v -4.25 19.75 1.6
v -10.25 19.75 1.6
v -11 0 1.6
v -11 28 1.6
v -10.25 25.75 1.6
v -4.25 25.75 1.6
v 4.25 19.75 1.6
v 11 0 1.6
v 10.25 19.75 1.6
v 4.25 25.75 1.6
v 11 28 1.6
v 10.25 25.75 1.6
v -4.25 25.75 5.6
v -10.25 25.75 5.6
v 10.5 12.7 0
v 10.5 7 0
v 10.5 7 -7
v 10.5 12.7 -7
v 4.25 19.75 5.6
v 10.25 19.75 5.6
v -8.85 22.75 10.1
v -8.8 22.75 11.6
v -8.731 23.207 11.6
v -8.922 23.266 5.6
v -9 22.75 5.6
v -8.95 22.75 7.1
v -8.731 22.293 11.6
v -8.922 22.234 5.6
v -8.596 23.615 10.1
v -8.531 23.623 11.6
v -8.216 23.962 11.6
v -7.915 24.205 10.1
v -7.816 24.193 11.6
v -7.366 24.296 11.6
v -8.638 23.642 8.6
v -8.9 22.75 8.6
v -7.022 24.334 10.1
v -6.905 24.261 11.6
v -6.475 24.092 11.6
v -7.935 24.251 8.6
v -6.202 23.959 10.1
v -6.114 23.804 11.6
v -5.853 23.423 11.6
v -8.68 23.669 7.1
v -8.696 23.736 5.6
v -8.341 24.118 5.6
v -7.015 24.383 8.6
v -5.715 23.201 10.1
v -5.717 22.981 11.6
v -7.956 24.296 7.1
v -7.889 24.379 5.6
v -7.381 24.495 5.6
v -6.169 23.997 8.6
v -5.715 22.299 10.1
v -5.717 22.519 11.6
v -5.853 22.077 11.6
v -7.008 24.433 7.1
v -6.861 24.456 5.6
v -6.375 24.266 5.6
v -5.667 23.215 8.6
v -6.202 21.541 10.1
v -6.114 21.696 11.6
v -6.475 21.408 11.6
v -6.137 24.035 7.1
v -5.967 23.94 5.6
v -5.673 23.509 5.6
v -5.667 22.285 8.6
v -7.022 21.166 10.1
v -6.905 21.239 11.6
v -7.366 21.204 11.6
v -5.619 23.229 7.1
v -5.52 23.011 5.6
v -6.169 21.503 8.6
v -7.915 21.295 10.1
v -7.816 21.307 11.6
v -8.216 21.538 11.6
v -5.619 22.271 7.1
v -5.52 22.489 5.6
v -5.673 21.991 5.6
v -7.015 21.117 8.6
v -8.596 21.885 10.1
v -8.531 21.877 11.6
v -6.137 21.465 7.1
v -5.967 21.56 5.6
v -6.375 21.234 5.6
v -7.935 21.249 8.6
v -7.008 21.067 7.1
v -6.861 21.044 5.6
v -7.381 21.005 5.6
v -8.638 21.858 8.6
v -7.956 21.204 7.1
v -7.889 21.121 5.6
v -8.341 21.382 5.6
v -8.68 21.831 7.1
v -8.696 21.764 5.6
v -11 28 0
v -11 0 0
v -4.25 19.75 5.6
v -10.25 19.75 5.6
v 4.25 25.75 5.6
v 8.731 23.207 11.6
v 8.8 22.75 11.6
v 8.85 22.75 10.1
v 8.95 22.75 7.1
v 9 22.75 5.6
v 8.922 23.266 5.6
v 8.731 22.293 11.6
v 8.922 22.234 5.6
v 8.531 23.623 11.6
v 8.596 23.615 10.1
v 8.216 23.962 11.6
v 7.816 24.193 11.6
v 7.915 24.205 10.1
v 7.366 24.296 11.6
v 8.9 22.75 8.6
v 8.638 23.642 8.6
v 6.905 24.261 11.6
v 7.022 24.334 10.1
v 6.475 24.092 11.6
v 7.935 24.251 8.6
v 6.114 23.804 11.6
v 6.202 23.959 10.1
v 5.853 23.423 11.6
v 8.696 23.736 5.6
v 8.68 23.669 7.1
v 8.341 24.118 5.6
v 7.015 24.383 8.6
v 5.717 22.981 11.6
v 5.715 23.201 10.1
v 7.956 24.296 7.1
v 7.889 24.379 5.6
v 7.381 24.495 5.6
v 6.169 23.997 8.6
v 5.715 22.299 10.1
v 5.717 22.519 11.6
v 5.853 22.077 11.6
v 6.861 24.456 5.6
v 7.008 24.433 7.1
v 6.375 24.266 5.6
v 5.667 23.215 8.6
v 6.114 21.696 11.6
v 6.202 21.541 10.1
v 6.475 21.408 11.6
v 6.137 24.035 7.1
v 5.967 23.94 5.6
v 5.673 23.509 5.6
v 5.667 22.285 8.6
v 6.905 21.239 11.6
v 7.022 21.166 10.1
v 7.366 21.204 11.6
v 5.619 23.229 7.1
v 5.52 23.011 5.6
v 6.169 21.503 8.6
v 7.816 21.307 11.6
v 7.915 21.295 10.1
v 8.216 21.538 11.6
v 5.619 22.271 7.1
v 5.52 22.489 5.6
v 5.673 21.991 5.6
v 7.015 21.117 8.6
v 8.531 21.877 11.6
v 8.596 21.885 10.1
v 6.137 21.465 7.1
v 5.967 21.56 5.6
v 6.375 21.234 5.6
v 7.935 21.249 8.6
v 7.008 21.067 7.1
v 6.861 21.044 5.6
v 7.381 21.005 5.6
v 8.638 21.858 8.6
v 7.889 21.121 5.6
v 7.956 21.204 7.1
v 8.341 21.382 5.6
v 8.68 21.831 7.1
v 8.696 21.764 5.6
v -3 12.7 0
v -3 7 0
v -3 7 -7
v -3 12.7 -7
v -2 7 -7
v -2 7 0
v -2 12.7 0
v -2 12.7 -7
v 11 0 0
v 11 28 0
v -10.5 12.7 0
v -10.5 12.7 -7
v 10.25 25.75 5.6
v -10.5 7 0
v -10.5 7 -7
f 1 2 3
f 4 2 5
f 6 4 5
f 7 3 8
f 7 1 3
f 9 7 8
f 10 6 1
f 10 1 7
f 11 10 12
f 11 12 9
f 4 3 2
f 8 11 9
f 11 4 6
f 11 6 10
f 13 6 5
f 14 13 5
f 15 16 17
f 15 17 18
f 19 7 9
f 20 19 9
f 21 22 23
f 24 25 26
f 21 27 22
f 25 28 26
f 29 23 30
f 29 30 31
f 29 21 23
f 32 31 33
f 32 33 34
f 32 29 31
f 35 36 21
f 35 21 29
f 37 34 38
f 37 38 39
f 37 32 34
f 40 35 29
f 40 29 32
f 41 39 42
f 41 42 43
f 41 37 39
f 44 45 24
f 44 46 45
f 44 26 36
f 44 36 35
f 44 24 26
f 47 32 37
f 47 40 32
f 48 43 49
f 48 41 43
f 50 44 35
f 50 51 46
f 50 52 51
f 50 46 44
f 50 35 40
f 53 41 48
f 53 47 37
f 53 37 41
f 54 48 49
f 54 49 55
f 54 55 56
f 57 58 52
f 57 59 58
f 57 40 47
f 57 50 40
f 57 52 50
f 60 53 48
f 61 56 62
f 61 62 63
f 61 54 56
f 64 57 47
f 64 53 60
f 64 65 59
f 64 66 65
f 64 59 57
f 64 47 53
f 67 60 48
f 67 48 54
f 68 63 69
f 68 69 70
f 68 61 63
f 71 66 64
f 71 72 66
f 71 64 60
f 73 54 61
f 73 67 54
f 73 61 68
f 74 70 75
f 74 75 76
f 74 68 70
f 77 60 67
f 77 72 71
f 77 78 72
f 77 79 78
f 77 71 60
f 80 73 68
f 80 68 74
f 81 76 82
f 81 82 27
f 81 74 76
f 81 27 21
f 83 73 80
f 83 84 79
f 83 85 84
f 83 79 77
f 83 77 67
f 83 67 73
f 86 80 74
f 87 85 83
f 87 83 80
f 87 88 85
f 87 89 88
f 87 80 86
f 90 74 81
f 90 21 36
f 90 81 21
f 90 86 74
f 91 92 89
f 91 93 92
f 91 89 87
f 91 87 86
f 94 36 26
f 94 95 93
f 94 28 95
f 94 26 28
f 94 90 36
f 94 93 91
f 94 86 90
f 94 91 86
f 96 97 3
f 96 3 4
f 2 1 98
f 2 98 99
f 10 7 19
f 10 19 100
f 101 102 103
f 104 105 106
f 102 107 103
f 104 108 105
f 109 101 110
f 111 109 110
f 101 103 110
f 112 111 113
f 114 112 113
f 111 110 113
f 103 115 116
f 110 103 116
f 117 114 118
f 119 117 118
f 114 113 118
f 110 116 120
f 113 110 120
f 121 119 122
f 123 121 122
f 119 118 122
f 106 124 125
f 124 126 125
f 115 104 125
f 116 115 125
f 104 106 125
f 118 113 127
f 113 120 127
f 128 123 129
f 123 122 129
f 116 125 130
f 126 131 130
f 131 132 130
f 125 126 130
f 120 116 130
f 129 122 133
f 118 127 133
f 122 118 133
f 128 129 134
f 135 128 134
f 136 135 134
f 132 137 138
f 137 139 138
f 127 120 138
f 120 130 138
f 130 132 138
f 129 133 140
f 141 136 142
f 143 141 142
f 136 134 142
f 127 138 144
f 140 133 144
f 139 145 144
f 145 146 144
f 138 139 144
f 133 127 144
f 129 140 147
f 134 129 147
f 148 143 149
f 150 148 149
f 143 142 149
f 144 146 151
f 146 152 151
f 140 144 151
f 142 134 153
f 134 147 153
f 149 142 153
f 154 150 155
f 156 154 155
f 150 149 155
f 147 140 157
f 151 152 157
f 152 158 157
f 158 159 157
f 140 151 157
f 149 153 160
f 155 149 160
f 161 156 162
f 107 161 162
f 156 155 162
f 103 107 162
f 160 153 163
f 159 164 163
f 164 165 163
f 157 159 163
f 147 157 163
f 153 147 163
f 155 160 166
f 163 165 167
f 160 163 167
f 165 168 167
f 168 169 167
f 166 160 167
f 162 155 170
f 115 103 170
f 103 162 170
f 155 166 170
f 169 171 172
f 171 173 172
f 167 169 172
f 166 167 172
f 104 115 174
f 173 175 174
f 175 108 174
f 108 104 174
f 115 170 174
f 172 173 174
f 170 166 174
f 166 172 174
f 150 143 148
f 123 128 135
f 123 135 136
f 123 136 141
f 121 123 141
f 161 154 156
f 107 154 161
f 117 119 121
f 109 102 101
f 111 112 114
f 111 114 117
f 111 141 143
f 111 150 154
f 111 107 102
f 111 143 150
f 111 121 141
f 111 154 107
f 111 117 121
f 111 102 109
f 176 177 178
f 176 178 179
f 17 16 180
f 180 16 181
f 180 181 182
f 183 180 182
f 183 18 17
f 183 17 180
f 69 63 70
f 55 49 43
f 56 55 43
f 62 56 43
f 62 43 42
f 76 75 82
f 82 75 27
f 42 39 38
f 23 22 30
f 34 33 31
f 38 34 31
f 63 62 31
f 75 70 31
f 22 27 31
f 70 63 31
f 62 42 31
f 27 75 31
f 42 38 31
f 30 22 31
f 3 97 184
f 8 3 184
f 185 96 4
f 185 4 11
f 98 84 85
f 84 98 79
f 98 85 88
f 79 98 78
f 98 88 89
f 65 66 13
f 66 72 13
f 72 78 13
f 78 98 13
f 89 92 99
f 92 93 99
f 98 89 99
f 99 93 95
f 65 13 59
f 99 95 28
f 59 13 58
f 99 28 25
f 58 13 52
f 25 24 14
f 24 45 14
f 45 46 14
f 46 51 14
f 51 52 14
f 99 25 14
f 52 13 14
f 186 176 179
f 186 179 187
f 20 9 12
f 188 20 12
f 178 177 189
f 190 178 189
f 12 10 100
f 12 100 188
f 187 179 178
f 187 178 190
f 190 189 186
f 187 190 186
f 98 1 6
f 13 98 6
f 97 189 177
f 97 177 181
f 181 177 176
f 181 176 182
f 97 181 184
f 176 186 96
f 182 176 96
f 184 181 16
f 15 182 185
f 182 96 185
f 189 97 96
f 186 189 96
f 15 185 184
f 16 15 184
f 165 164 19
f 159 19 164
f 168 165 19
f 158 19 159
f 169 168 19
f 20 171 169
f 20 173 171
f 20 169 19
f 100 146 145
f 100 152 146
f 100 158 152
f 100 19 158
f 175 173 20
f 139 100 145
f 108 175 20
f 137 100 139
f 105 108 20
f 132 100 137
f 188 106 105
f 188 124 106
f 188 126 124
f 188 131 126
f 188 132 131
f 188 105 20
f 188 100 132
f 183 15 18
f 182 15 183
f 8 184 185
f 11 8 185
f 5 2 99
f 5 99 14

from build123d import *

# Parameters (mm, degrees)
SKETCH1_W           = 22
SKETCH1_H           = 28
BOSS_EXTRUDE1_DEPTH = 1.6
SKETCH2_W           = 6
SKETCH2_H           = 6
BOSS_EXTRUDE2_DEPTH = 4
SKETCH3_W           = 12.5
SKETCH3_H           = 5.7
SKETCH3_W_2         = 7.5
BOSS_EXTRUDE3_DEPTH = 7
SKETCH5_R           = 1.55
SKETCH6_R           = 1.75


with BuildPart() as part:
    # Sketch1 → Boss-Extrude1 (new body)
    with BuildSketch(Plane.XY):
        with Locations((0, 14)):
            Rectangle(SKETCH1_W, SKETCH1_H)
    extrude(amount=BOSS_EXTRUDE1_DEPTH)

    # Sketch2 → Boss-Extrude2 (add)
    with BuildSketch(Plane.XY.offset(1.6)):
        with Locations((7.25, 22.75)):
            Rectangle(SKETCH2_W, SKETCH2_H)
    boss_extrude2 = extrude(amount=BOSS_EXTRUDE2_DEPTH)

    # Sketch3 → Boss-Extrude3 (add)
    with BuildSketch(Plane(origin=(0, 0, 0), x_dir=(-1, 0, 0), z_dir=(0, 0, -1))):
        with Locations((-4.25, 9.85)):
            Rectangle(SKETCH3_W, SKETCH3_H)
        with Locations((6.75, 9.85)):
            Rectangle(SKETCH3_W_2, SKETCH3_H)
    extrude(amount=BOSS_EXTRUDE3_DEPTH)

    # Sketch5 → Loft1 section 0
    with BuildSketch(Plane.XY.offset(11.6)):
        with Locations((7.25, 22.75)):
            Circle(SKETCH5_R)
    # Sketch6 → Loft1 section 1
    with BuildSketch(Plane.XY.offset(5.6)):
        with Locations((7.25, 22.75)):
            Circle(SKETCH6_R)
    loft1 = loft()

    # Mirror1: Boss-Extrude2, Loft1 across plane
    add(boss_extrude2.mirror(Plane(origin=(0, 0, 0), x_dir=(0, 0, 1), z_dir=(1, 0, 0))))
    add(loft1.mirror(Plane(origin=(0, 0, 0), x_dir=(0, 0, 1), z_dir=(1, 0, 0))))


solid = part.part
